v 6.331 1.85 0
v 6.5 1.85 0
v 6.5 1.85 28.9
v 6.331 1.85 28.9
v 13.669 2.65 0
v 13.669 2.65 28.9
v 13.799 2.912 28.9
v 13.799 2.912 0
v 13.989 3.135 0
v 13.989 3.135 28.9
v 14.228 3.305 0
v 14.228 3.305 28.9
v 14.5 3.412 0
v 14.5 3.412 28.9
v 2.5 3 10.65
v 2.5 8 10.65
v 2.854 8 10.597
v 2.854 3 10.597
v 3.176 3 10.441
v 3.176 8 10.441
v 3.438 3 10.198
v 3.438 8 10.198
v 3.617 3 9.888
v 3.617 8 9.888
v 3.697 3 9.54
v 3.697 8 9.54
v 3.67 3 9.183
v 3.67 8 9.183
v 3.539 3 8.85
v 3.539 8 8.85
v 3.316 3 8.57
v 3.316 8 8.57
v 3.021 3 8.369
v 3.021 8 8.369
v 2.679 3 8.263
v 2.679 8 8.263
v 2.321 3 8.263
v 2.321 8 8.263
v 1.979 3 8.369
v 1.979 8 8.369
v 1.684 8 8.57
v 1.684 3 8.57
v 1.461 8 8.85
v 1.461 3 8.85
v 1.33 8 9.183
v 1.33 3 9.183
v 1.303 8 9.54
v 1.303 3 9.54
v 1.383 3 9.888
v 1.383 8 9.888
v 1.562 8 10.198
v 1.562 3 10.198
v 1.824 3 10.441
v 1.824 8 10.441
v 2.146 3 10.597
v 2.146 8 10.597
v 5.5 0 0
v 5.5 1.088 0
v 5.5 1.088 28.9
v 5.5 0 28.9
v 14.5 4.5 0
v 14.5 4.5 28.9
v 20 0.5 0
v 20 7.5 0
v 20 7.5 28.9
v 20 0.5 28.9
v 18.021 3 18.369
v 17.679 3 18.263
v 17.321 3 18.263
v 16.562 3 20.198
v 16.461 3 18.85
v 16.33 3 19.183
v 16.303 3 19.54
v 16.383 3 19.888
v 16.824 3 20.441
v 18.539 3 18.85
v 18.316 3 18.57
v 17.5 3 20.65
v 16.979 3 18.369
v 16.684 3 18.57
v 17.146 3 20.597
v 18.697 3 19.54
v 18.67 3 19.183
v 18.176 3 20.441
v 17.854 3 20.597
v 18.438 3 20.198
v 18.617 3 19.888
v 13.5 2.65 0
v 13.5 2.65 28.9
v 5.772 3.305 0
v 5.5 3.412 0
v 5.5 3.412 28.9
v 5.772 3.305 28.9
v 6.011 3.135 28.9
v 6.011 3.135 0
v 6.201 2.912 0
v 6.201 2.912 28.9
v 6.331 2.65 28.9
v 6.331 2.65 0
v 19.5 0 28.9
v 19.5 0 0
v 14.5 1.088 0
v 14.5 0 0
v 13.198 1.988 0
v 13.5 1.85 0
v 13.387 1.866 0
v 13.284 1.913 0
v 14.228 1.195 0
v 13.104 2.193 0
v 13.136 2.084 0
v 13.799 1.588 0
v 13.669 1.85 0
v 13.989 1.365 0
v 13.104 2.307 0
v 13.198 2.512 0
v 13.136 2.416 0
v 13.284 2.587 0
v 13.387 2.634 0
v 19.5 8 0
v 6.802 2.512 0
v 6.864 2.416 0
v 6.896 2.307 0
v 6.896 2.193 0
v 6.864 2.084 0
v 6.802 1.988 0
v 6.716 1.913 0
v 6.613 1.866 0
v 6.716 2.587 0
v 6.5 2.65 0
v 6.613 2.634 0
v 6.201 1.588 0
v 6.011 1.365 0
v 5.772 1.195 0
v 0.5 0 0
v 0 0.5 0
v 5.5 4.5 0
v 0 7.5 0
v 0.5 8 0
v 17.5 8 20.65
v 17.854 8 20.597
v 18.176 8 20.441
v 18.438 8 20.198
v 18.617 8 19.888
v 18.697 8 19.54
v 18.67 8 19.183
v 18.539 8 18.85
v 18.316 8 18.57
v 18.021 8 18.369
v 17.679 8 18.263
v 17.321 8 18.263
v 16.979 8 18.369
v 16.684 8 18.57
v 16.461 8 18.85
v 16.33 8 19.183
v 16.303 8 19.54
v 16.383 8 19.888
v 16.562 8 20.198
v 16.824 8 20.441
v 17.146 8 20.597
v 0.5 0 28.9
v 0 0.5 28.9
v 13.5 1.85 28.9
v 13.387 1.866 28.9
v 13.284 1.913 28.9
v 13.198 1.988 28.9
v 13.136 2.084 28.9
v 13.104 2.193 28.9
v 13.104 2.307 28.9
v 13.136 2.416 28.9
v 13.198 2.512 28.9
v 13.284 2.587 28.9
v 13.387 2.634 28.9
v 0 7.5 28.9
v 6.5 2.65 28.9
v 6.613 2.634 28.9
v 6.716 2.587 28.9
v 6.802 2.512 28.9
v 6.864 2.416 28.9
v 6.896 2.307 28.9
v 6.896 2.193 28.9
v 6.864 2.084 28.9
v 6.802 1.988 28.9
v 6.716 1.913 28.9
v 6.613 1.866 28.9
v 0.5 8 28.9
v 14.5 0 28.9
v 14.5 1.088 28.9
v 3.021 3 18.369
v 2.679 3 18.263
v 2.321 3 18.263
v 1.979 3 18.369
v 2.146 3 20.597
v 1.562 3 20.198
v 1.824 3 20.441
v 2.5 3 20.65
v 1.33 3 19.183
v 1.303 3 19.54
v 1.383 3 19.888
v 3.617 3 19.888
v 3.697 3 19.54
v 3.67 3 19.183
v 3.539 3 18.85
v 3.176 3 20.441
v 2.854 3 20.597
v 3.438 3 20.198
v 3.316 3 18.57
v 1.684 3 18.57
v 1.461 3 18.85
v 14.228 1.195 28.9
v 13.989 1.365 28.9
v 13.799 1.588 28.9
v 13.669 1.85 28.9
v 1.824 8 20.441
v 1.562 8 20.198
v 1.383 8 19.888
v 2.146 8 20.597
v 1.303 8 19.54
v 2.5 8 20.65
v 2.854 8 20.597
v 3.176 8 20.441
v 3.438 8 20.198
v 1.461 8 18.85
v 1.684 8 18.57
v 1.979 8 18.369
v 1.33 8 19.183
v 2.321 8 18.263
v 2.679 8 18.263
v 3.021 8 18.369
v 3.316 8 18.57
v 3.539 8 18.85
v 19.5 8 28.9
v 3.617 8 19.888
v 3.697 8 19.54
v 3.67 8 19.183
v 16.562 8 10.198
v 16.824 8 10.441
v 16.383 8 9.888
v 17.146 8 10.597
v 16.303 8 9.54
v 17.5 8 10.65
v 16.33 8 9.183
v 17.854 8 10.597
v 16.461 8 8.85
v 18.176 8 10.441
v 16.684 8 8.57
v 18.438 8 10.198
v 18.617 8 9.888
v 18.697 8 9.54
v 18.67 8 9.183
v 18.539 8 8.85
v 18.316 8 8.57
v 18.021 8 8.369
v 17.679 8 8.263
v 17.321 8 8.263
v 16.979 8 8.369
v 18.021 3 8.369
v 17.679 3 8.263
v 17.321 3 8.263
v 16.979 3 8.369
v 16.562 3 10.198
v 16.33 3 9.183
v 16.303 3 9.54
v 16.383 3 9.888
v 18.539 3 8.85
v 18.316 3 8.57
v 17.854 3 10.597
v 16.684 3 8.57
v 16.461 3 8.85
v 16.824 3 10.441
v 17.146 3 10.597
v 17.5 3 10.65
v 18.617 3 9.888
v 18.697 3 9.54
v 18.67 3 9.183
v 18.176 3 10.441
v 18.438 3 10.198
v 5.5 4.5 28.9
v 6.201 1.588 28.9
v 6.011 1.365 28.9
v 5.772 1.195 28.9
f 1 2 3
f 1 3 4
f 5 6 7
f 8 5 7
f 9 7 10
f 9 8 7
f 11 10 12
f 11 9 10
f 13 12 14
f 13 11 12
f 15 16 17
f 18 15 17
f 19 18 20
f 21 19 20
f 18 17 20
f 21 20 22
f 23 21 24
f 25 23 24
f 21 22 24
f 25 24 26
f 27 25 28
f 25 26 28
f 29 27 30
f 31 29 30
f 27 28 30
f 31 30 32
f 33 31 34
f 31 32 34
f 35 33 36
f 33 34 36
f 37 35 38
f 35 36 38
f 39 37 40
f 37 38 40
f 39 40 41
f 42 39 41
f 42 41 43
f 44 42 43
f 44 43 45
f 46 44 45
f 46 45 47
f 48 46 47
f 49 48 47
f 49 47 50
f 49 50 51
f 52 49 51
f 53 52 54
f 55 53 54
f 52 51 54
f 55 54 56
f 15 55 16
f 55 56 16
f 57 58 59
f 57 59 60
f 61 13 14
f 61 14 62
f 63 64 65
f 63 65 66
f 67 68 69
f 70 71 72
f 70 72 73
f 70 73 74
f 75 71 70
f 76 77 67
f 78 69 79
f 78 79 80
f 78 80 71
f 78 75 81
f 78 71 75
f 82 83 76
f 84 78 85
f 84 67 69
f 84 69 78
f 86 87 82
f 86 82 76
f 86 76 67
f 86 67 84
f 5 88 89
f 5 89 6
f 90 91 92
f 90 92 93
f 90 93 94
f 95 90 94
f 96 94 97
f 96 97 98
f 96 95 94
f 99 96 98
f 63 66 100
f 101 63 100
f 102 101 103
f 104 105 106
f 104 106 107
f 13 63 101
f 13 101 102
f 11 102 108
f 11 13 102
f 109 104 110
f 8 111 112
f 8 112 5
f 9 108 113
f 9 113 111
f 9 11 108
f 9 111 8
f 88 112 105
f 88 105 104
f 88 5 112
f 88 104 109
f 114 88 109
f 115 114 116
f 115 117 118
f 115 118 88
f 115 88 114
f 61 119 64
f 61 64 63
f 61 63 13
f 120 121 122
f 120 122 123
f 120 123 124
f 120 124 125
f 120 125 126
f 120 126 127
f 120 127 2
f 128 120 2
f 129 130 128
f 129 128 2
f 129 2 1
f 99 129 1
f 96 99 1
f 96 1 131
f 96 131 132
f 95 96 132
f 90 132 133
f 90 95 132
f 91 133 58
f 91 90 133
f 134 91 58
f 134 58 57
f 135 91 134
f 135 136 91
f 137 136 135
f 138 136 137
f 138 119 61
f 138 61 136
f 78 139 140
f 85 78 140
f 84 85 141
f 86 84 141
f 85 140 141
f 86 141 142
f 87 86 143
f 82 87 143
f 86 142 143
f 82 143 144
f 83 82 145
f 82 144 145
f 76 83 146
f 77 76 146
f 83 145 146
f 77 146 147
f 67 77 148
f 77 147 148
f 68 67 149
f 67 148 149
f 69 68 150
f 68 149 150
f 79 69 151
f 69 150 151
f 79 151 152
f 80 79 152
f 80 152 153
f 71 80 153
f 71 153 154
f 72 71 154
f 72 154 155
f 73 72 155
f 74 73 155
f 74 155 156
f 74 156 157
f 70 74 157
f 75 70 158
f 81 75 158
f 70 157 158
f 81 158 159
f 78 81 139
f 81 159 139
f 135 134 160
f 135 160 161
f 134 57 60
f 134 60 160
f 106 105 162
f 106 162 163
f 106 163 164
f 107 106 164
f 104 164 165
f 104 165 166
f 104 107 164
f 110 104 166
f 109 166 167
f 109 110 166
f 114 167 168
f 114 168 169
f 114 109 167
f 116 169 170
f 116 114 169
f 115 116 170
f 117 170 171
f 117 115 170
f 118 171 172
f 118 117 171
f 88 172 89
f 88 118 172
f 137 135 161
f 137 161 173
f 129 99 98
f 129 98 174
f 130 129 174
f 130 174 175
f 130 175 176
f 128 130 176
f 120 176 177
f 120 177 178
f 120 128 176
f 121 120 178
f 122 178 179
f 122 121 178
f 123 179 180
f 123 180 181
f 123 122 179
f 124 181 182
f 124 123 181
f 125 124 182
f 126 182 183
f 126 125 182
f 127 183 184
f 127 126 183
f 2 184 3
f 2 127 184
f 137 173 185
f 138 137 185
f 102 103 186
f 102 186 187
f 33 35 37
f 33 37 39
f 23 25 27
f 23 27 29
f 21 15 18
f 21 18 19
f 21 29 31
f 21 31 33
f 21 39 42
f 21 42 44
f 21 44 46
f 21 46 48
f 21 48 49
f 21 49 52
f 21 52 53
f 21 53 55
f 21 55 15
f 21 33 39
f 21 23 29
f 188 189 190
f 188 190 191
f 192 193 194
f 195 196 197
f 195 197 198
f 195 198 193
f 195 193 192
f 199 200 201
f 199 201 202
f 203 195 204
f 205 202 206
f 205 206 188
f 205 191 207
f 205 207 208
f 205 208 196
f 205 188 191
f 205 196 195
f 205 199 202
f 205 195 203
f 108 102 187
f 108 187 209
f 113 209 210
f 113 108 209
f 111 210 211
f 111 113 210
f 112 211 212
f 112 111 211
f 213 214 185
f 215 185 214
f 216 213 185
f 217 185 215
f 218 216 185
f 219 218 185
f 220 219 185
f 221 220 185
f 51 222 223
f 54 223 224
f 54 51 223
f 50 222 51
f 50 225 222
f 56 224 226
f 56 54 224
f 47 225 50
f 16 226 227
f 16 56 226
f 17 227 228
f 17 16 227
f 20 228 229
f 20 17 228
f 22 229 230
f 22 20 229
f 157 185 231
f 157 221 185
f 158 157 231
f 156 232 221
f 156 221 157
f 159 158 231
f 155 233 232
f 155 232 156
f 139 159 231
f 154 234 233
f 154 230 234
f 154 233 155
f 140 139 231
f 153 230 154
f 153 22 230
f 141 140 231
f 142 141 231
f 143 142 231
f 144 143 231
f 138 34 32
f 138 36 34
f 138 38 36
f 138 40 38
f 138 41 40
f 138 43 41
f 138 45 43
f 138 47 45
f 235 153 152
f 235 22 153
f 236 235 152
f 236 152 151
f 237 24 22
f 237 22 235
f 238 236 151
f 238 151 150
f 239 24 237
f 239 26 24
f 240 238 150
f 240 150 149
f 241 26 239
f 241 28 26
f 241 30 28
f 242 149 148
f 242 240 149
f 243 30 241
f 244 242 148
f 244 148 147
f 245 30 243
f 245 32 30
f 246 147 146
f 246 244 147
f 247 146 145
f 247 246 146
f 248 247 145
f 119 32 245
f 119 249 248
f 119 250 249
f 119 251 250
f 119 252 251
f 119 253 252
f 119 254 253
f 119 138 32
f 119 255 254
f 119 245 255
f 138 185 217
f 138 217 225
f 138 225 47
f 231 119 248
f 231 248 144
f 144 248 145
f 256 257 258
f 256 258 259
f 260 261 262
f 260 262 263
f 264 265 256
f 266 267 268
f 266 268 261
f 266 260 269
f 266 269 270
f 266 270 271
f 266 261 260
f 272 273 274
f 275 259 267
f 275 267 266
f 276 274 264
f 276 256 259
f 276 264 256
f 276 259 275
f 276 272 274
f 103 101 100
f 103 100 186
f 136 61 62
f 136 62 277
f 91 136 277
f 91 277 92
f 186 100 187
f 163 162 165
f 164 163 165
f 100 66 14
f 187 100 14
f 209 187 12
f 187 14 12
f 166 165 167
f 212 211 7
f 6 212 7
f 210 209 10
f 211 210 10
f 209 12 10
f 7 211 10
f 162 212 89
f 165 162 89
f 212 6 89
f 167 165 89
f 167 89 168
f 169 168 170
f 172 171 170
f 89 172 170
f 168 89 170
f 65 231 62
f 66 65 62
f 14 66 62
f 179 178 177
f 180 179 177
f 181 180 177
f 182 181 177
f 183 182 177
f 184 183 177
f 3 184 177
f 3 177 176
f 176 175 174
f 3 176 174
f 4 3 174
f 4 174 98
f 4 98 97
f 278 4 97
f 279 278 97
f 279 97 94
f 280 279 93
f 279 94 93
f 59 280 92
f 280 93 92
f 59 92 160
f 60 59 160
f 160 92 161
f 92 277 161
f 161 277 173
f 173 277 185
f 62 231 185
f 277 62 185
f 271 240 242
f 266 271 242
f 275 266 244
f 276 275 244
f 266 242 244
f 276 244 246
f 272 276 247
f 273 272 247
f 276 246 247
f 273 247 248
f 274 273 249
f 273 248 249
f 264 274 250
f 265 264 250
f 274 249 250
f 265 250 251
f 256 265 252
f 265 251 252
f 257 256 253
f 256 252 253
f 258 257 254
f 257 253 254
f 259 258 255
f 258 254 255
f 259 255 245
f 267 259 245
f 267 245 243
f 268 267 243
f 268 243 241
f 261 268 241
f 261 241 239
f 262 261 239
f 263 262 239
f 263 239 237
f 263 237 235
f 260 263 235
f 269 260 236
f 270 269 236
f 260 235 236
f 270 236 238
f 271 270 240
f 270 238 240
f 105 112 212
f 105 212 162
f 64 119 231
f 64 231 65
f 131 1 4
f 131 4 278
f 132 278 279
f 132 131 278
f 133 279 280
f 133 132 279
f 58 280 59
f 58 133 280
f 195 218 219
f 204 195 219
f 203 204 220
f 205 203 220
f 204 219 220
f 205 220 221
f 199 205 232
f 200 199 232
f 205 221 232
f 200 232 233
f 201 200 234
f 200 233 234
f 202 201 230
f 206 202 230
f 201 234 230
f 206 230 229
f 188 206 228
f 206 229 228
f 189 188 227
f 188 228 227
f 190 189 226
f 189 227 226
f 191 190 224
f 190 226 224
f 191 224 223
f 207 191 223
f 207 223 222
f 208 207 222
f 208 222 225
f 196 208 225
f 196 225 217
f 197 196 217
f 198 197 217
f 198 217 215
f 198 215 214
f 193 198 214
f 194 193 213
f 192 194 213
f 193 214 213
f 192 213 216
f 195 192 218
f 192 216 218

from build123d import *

# Parameters (mm, degrees)
EXTRUDE_1_DEPTH     = 28.9
SKETCH_2_R          = 1.2
CUT_EXTRUDE_1_DEPTH = 5


with BuildPart() as part:
    # 草图1 → 凸台-拉伸1 (new body)
    with BuildSketch(Plane.XY):
        with BuildLine():
            Line((0, 0.5), (0, 7.5))
            Line((0, 7.5), (0.5, 8))
            Line((0.5, 8), (19.5, 8))
            Line((19.5, 8), (20, 7.5))
            Line((20, 7.5), (20, 0.5))
            Line((20, 0.5), (19.5, 0))
            Line((19.5, 0), (14.5, 0))
            Line((14.5, 0), (14.5, 1.088104996))
            ThreePointArc((14.5, 1.088104996), (13.989243177, 1.365311708), (13.66862915, 1.85))
            Line((13.66862915, 1.85), (13.5, 1.85))
            ThreePointArc((13.5, 1.85), (13.1, 2.25), (13.5, 2.65))
            Line((13.5, 2.65), (13.66862915, 2.65))
            ThreePointArc((13.66862915, 2.65), (13.989243177, 3.134688292), (14.5, 3.411895004))
            Line((14.5, 3.411895004), (14.5, 4.5))
            Line((14.5, 4.5), (5.5, 4.5))
            Line((5.5, 4.5), (5.5, 3.411895004))
            ThreePointArc((5.5, 3.411895004), (6.010756823, 3.134688292), (6.33137085, 2.65))
            Line((6.33137085, 2.65), (6.5, 2.65))
            ThreePointArc((6.5, 2.65), (6.9, 2.25), (6.5, 1.85))
            Line((6.5, 1.85), (6.33137085, 1.85))
            ThreePointArc((6.33137085, 1.85), (6.010756823, 1.365311708), (5.5, 1.088104996))
            Line((5.5, 1.088104996), (5.5, 0))
            Line((5.5, 0), (0.5, 0))
            Line((0.5, 0), (0, 0.5))
        make_face()
    extrude(amount=EXTRUDE_1_DEPTH)

    # 草图2 → 切除-拉伸1 (cut)
    with BuildSketch(Plane(origin=(0, 8, 0), x_dir=(1, 0, 0), z_dir=(0, 1, 0))):
        with Locations(Location((2.5, -19.45, 0), (0, 0, 270))):
            Circle(SKETCH_2_R)
        with Locations(Location((2.5, -9.45, 0), (0, 0, 270))):
            Circle(SKETCH_2_R)
        with Locations(Location((17.5, -9.45, 0), (0, 0, 270))):
            Circle(SKETCH_2_R)
        with Locations(Location((17.5, -19.45, 0), (0, 0, 270))):
            Circle(SKETCH_2_R)
    extrude(amount=-CUT_EXTRUDE_1_DEPTH, mode=Mode.SUBTRACT)


solid = part.part
